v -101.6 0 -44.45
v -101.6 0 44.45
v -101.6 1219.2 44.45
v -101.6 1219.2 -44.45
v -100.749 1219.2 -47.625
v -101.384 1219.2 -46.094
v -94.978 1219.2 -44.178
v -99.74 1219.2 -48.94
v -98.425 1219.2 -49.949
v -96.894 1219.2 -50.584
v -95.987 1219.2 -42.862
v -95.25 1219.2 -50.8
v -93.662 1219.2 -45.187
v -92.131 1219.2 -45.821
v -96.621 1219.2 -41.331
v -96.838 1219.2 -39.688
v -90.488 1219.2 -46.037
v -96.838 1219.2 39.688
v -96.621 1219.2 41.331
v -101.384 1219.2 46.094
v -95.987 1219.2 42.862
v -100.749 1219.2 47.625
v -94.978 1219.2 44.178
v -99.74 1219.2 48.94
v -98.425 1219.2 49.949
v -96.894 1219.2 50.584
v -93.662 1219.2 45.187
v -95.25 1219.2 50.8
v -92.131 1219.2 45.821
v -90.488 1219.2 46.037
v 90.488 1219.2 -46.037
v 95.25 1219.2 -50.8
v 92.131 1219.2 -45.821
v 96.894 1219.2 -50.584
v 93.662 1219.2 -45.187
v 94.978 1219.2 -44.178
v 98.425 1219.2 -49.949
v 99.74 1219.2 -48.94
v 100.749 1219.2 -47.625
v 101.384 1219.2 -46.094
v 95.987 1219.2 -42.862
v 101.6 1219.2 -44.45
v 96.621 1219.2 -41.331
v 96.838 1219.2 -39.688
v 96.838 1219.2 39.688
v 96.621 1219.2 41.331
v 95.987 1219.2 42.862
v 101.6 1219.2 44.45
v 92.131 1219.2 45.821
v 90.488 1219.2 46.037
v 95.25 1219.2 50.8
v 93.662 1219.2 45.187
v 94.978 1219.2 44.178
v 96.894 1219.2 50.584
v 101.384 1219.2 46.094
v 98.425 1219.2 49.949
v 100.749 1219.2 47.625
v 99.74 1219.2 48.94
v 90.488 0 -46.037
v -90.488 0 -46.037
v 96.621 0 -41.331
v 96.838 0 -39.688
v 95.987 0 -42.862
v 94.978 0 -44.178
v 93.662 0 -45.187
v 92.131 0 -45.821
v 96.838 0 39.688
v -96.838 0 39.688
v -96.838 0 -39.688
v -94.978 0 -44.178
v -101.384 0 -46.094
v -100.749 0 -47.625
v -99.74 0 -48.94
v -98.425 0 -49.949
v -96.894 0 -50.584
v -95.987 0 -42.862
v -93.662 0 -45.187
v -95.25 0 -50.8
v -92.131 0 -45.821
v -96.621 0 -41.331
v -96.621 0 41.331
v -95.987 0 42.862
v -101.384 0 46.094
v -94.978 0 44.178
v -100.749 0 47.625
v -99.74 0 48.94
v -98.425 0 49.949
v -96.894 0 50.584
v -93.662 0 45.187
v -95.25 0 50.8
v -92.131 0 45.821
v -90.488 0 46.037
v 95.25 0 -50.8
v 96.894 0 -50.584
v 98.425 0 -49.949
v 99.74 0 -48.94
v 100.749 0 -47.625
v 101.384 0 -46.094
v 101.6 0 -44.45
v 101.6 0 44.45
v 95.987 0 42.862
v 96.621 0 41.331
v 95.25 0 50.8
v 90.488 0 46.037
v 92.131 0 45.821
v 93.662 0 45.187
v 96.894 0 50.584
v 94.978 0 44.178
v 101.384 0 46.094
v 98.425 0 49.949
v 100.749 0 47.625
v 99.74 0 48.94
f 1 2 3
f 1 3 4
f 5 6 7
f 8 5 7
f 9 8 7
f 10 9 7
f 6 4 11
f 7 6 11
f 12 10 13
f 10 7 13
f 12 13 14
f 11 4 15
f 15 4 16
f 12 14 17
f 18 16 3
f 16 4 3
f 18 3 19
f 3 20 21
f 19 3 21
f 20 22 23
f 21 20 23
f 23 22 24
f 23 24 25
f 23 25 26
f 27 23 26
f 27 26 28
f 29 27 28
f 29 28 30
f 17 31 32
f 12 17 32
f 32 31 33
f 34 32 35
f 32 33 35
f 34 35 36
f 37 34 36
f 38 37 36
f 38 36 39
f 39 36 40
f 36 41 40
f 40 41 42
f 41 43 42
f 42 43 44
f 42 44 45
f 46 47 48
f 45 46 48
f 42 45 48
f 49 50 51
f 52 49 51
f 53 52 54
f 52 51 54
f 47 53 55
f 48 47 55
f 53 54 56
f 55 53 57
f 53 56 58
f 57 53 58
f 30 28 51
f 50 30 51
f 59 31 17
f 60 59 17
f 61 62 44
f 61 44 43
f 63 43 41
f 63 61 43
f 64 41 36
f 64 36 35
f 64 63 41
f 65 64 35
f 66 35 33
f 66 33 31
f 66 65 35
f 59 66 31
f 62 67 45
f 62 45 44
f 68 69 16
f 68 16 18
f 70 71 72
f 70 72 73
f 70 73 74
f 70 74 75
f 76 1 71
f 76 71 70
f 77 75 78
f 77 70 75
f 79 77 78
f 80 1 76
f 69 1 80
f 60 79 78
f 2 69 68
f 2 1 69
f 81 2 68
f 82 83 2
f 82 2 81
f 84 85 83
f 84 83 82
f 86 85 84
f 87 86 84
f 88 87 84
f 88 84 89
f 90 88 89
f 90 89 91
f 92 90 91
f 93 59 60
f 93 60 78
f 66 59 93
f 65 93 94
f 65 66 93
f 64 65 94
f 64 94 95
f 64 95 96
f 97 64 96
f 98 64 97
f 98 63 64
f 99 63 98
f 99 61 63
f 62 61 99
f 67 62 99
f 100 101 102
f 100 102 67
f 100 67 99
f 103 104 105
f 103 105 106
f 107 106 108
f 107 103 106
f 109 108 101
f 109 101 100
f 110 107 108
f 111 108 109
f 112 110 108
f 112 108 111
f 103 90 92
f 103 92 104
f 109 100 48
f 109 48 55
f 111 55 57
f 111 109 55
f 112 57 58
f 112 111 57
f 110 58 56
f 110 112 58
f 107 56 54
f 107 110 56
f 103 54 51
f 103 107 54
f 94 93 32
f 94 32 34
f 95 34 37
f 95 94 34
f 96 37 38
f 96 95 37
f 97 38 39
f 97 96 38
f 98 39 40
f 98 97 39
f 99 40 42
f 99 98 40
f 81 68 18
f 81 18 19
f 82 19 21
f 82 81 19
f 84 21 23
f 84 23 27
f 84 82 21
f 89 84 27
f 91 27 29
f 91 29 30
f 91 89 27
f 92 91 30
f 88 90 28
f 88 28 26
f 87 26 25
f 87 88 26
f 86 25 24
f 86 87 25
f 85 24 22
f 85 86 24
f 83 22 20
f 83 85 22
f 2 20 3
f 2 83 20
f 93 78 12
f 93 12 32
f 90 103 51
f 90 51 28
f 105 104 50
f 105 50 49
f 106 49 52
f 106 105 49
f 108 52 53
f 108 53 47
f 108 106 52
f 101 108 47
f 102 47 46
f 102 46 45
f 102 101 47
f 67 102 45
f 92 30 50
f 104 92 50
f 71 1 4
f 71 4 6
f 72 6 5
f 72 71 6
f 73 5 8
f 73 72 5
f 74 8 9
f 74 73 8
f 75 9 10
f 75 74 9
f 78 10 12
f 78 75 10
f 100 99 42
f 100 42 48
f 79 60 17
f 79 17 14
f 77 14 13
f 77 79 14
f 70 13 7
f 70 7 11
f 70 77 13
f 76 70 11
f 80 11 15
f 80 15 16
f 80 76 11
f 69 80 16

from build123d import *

# Parameters (mm, degrees)
F1_DEPTH = 1219.2


with BuildPart() as f1:
    # F0 (on Front) → F1 (new body)
    with BuildSketch(Plane.XZ):
        with BuildLine():
            ThreePointArc((101.6, 44.45), (99.740128, 48.940128), (95.25, 50.8))
            Line((95.25, 50.8), (-95.25, 50.8))
            ThreePointArc((-95.25, 50.8), (-99.740128, 48.940128), (-101.6, 44.45))
            Line((-101.6, 44.45), (-101.6, -44.45))
            ThreePointArc((-101.6, -44.45), (-99.740128, -48.940128), (-95.25, -50.8))
            Line((-95.25, -50.8), (95.25, -50.8))
            ThreePointArc((95.25, -50.8), (99.740128, -48.940128), (101.6, -44.45))
            Line((101.6, -44.45), (101.6, 44.45))
        make_face()
        with BuildLine():
            Line((-90.4875, 46.0375), (90.4875, 46.0375))
            ThreePointArc((90.4875, 46.0375), (94.977628, 44.177628), (96.8375, 39.6875))
            Line((96.8375, 39.6875), (96.8375, -39.6875))
            ThreePointArc((96.8375, -39.6875), (94.977628, -44.177628), (90.4875, -46.0375))
            Line((90.4875, -46.0375), (-90.4875, -46.0375))
            ThreePointArc((-90.4875, -46.0375), (-94.977628, -44.177628), (-96.8375, -39.6875))
            Line((-96.8375, -39.6875), (-96.8375, 39.6875))
            ThreePointArc((-96.8375, 39.6875), (-94.977628, 44.177628), (-90.4875, 46.0375))
        make_face(mode=Mode.SUBTRACT)
    extrude(amount=-F1_DEPTH)


solid = f1.part
